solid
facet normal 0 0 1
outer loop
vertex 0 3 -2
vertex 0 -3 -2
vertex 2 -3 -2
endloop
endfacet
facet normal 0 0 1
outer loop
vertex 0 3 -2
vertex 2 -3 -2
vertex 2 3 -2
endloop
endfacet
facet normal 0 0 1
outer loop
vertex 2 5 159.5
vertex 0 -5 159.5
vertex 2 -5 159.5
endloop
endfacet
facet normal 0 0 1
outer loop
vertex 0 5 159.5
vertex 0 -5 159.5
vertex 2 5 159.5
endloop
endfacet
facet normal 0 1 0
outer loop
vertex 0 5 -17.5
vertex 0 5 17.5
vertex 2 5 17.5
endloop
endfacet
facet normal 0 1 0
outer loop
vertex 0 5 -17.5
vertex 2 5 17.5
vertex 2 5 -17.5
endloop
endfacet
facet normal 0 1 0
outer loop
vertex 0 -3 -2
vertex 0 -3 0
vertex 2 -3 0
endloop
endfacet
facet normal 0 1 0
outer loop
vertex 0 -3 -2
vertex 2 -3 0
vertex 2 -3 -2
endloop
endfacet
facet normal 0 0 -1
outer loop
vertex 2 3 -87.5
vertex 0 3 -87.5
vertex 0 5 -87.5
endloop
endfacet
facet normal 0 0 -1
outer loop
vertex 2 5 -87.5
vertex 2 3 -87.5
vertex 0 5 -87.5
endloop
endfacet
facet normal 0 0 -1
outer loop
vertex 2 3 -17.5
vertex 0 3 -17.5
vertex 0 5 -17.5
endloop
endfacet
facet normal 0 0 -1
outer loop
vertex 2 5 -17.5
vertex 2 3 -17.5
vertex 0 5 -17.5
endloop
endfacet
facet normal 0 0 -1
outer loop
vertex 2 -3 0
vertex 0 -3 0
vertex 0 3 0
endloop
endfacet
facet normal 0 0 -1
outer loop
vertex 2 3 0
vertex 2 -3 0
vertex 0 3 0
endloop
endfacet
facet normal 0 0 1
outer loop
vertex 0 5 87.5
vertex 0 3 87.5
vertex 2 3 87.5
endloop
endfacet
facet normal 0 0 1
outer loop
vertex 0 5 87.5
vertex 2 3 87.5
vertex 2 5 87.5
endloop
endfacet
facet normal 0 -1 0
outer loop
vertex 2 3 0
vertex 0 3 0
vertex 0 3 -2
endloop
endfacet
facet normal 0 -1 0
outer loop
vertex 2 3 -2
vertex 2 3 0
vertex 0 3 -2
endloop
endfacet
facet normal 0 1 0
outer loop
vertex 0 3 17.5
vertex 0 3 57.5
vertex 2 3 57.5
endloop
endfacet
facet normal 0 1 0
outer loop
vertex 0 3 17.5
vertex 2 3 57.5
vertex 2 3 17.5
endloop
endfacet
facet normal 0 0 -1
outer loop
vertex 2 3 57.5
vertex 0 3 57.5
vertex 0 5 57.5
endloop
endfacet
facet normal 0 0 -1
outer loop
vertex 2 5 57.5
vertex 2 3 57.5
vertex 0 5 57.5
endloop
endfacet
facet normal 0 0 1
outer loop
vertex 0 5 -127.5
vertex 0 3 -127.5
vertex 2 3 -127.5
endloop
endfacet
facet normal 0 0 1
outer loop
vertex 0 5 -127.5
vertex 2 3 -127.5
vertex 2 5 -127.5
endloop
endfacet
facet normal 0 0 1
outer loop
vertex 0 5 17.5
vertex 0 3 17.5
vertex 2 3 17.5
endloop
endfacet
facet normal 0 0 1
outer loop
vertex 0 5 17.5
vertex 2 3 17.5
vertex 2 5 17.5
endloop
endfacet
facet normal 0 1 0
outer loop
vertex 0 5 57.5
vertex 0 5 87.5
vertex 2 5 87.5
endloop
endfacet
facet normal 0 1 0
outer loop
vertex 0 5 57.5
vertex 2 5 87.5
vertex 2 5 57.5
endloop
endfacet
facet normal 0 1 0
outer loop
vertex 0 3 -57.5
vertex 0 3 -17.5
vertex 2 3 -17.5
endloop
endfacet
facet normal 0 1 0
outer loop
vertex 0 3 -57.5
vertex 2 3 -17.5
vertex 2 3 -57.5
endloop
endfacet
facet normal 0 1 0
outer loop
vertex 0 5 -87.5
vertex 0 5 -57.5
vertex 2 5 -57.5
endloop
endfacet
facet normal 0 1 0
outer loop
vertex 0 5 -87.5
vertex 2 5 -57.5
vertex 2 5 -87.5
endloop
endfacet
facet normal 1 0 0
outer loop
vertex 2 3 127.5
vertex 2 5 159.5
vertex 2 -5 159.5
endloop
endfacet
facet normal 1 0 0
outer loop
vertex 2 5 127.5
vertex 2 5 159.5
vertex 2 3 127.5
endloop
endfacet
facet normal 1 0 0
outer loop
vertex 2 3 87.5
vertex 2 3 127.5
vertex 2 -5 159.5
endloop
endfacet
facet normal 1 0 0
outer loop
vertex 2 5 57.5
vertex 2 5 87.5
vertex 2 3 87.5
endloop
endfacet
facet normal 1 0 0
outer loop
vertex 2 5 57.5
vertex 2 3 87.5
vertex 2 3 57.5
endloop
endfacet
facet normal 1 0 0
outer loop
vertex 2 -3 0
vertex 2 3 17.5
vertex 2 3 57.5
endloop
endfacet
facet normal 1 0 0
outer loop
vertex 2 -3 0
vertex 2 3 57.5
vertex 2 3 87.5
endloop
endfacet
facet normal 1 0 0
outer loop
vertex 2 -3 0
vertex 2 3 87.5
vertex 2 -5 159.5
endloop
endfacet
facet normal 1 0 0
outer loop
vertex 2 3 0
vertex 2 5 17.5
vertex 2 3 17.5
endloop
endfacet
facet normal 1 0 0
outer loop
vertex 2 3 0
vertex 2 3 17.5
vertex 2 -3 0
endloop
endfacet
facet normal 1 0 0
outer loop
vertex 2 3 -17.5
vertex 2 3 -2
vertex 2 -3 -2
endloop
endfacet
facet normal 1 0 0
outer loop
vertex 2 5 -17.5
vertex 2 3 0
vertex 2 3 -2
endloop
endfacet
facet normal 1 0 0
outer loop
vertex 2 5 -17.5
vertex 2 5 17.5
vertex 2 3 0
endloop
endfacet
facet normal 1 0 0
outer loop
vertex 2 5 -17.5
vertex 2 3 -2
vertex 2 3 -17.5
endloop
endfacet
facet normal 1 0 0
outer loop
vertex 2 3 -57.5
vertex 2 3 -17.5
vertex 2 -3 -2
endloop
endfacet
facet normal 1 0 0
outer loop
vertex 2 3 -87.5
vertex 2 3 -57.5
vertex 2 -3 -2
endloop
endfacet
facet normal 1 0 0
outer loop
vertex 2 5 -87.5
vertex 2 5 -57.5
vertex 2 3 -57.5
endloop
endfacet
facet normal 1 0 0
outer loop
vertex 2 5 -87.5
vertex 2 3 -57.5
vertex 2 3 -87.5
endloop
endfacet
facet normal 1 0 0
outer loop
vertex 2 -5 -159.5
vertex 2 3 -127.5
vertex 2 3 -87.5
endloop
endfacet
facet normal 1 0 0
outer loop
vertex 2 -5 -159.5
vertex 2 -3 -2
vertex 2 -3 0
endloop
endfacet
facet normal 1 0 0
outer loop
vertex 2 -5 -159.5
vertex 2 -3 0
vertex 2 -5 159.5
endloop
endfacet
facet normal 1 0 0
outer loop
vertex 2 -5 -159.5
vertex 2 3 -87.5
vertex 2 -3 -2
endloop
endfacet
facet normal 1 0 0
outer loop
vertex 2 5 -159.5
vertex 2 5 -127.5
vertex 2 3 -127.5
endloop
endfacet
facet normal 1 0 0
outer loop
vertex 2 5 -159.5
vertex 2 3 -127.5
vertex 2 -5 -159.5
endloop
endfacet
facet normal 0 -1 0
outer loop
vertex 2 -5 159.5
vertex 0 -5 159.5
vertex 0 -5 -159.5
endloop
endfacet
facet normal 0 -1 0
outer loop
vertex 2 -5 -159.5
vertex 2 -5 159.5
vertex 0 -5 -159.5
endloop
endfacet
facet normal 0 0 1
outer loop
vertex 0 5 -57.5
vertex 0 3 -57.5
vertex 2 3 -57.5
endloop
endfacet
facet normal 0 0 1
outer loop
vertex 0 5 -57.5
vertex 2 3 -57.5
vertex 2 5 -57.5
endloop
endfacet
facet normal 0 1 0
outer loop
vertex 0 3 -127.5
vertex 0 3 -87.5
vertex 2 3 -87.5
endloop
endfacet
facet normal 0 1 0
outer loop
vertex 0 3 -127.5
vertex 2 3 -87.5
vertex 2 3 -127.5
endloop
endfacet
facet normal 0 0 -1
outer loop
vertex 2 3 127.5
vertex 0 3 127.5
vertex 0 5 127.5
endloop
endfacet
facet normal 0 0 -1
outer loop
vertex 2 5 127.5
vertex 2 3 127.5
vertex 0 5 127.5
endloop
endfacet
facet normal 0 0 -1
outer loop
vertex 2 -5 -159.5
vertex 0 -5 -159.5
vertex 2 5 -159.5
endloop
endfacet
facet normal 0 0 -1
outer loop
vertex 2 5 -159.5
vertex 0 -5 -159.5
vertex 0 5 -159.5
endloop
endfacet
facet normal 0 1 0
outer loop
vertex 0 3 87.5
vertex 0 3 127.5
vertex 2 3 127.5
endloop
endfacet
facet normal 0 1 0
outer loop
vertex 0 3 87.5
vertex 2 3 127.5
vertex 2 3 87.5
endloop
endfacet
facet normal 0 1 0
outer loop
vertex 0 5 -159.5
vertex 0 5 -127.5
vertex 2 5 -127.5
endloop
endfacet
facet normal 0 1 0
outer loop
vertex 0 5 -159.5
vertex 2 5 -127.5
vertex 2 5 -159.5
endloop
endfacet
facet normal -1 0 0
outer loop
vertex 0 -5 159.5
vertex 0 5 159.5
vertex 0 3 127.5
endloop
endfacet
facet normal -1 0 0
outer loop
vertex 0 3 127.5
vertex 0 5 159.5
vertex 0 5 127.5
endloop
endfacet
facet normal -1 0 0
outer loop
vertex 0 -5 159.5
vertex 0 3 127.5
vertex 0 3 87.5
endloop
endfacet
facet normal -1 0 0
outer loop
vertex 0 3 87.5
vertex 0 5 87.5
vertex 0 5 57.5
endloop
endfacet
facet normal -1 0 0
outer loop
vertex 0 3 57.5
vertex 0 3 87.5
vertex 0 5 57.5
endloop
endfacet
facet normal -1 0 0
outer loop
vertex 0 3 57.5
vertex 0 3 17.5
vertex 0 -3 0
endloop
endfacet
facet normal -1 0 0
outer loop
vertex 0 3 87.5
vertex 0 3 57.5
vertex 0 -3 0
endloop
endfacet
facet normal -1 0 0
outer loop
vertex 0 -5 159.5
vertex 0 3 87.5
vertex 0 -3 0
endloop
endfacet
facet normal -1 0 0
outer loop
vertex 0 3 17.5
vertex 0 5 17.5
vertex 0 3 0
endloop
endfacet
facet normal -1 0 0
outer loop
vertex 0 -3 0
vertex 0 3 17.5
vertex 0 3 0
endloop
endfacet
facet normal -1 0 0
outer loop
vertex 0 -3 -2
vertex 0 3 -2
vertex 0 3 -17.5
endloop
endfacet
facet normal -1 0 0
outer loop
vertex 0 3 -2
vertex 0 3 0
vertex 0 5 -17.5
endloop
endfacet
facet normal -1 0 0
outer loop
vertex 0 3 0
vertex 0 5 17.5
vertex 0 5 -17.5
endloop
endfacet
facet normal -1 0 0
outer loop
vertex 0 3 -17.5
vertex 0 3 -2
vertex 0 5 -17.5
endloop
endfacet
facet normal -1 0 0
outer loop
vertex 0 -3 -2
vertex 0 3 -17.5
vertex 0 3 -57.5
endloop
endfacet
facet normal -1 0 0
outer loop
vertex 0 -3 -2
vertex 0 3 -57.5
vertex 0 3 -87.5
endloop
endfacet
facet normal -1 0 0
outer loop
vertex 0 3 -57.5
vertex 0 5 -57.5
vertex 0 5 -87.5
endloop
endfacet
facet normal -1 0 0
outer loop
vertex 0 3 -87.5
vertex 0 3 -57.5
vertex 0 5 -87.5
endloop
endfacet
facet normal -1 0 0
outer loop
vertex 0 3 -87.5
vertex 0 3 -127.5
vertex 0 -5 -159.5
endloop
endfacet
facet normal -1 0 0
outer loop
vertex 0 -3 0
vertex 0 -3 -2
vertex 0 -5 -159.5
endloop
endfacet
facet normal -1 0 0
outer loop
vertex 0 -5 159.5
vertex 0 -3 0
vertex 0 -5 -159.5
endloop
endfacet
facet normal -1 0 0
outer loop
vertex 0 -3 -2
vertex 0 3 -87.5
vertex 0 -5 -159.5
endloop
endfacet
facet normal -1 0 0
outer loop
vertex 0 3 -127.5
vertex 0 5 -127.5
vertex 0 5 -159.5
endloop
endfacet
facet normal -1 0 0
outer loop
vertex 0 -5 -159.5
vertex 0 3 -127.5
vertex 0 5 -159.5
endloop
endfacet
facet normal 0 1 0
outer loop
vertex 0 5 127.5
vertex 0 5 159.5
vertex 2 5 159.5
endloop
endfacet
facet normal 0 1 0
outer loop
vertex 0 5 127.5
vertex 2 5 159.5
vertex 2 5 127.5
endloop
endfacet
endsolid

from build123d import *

# Parameters (mm, degrees)
SKETCH1_W               = 319
SKETCH1_H               = 10
BOSS_EXTRUDE1_DEPTH     = 2
CUT_EXTRUDE1_DEPTH      = 160.590883198
CUT_EXTRUDE1_DEPTH_BACK = 160.590883198
SKETCH2_W               = 40
SKETCH2_H               = 2
CUT_EXTRUDE2_DEPTH      = 160.590883198
CUT_EXTRUDE2_DEPTH_BACK = 160.590883198
SKETCH4_W               = 2
SKETCH4_H               = 6


with BuildPart() as part:
    # Sketch1 → Boss-Extrude1 (new body)
    with BuildSketch(Plane(origin=(0, 0, 0), x_dir=(0, 0, -1), z_dir=(1, 0, 0))):
        Rectangle(SKETCH1_W, SKETCH1_H)
    extrude(amount=BOSS_EXTRUDE1_DEPTH)

    # Sketch2 → Cut-Extrude1 (cut, two sides: drawn at the far end of the back side and taken through both)
    with BuildSketch(Plane(origin=(2, 0, 0), x_dir=(0, 0, -1), z_dir=(1, 0, 0)).offset(-CUT_EXTRUDE1_DEPTH_BACK)):
        with Locations((-107.5, 4)):
            Rectangle(SKETCH2_W, SKETCH2_H)
        with Locations((-37.5, 4)):
            Rectangle(SKETCH2_W, SKETCH2_H)
        with Locations((37.5, 4)):
            Rectangle(SKETCH2_W, SKETCH2_H)
        with Locations((107.5, 4)):
            Rectangle(SKETCH2_W, SKETCH2_H)
    extrude(amount=CUT_EXTRUDE1_DEPTH + CUT_EXTRUDE1_DEPTH_BACK, mode=Mode.SUBTRACT)

    # Sketch4 → Cut-Extrude2 (cut, two sides: drawn at the far end of the back side and taken through both)
    with BuildSketch(Plane(origin=(2, 0, 0), x_dir=(0, 0, -1), z_dir=(1, 0, 0)).offset(-CUT_EXTRUDE2_DEPTH_BACK)):
        with Locations((1, 0)):
            Rectangle(SKETCH4_W, SKETCH4_H)
    extrude(amount=CUT_EXTRUDE2_DEPTH + CUT_EXTRUDE2_DEPTH_BACK, mode=Mode.SUBTRACT)


solid = part.part
